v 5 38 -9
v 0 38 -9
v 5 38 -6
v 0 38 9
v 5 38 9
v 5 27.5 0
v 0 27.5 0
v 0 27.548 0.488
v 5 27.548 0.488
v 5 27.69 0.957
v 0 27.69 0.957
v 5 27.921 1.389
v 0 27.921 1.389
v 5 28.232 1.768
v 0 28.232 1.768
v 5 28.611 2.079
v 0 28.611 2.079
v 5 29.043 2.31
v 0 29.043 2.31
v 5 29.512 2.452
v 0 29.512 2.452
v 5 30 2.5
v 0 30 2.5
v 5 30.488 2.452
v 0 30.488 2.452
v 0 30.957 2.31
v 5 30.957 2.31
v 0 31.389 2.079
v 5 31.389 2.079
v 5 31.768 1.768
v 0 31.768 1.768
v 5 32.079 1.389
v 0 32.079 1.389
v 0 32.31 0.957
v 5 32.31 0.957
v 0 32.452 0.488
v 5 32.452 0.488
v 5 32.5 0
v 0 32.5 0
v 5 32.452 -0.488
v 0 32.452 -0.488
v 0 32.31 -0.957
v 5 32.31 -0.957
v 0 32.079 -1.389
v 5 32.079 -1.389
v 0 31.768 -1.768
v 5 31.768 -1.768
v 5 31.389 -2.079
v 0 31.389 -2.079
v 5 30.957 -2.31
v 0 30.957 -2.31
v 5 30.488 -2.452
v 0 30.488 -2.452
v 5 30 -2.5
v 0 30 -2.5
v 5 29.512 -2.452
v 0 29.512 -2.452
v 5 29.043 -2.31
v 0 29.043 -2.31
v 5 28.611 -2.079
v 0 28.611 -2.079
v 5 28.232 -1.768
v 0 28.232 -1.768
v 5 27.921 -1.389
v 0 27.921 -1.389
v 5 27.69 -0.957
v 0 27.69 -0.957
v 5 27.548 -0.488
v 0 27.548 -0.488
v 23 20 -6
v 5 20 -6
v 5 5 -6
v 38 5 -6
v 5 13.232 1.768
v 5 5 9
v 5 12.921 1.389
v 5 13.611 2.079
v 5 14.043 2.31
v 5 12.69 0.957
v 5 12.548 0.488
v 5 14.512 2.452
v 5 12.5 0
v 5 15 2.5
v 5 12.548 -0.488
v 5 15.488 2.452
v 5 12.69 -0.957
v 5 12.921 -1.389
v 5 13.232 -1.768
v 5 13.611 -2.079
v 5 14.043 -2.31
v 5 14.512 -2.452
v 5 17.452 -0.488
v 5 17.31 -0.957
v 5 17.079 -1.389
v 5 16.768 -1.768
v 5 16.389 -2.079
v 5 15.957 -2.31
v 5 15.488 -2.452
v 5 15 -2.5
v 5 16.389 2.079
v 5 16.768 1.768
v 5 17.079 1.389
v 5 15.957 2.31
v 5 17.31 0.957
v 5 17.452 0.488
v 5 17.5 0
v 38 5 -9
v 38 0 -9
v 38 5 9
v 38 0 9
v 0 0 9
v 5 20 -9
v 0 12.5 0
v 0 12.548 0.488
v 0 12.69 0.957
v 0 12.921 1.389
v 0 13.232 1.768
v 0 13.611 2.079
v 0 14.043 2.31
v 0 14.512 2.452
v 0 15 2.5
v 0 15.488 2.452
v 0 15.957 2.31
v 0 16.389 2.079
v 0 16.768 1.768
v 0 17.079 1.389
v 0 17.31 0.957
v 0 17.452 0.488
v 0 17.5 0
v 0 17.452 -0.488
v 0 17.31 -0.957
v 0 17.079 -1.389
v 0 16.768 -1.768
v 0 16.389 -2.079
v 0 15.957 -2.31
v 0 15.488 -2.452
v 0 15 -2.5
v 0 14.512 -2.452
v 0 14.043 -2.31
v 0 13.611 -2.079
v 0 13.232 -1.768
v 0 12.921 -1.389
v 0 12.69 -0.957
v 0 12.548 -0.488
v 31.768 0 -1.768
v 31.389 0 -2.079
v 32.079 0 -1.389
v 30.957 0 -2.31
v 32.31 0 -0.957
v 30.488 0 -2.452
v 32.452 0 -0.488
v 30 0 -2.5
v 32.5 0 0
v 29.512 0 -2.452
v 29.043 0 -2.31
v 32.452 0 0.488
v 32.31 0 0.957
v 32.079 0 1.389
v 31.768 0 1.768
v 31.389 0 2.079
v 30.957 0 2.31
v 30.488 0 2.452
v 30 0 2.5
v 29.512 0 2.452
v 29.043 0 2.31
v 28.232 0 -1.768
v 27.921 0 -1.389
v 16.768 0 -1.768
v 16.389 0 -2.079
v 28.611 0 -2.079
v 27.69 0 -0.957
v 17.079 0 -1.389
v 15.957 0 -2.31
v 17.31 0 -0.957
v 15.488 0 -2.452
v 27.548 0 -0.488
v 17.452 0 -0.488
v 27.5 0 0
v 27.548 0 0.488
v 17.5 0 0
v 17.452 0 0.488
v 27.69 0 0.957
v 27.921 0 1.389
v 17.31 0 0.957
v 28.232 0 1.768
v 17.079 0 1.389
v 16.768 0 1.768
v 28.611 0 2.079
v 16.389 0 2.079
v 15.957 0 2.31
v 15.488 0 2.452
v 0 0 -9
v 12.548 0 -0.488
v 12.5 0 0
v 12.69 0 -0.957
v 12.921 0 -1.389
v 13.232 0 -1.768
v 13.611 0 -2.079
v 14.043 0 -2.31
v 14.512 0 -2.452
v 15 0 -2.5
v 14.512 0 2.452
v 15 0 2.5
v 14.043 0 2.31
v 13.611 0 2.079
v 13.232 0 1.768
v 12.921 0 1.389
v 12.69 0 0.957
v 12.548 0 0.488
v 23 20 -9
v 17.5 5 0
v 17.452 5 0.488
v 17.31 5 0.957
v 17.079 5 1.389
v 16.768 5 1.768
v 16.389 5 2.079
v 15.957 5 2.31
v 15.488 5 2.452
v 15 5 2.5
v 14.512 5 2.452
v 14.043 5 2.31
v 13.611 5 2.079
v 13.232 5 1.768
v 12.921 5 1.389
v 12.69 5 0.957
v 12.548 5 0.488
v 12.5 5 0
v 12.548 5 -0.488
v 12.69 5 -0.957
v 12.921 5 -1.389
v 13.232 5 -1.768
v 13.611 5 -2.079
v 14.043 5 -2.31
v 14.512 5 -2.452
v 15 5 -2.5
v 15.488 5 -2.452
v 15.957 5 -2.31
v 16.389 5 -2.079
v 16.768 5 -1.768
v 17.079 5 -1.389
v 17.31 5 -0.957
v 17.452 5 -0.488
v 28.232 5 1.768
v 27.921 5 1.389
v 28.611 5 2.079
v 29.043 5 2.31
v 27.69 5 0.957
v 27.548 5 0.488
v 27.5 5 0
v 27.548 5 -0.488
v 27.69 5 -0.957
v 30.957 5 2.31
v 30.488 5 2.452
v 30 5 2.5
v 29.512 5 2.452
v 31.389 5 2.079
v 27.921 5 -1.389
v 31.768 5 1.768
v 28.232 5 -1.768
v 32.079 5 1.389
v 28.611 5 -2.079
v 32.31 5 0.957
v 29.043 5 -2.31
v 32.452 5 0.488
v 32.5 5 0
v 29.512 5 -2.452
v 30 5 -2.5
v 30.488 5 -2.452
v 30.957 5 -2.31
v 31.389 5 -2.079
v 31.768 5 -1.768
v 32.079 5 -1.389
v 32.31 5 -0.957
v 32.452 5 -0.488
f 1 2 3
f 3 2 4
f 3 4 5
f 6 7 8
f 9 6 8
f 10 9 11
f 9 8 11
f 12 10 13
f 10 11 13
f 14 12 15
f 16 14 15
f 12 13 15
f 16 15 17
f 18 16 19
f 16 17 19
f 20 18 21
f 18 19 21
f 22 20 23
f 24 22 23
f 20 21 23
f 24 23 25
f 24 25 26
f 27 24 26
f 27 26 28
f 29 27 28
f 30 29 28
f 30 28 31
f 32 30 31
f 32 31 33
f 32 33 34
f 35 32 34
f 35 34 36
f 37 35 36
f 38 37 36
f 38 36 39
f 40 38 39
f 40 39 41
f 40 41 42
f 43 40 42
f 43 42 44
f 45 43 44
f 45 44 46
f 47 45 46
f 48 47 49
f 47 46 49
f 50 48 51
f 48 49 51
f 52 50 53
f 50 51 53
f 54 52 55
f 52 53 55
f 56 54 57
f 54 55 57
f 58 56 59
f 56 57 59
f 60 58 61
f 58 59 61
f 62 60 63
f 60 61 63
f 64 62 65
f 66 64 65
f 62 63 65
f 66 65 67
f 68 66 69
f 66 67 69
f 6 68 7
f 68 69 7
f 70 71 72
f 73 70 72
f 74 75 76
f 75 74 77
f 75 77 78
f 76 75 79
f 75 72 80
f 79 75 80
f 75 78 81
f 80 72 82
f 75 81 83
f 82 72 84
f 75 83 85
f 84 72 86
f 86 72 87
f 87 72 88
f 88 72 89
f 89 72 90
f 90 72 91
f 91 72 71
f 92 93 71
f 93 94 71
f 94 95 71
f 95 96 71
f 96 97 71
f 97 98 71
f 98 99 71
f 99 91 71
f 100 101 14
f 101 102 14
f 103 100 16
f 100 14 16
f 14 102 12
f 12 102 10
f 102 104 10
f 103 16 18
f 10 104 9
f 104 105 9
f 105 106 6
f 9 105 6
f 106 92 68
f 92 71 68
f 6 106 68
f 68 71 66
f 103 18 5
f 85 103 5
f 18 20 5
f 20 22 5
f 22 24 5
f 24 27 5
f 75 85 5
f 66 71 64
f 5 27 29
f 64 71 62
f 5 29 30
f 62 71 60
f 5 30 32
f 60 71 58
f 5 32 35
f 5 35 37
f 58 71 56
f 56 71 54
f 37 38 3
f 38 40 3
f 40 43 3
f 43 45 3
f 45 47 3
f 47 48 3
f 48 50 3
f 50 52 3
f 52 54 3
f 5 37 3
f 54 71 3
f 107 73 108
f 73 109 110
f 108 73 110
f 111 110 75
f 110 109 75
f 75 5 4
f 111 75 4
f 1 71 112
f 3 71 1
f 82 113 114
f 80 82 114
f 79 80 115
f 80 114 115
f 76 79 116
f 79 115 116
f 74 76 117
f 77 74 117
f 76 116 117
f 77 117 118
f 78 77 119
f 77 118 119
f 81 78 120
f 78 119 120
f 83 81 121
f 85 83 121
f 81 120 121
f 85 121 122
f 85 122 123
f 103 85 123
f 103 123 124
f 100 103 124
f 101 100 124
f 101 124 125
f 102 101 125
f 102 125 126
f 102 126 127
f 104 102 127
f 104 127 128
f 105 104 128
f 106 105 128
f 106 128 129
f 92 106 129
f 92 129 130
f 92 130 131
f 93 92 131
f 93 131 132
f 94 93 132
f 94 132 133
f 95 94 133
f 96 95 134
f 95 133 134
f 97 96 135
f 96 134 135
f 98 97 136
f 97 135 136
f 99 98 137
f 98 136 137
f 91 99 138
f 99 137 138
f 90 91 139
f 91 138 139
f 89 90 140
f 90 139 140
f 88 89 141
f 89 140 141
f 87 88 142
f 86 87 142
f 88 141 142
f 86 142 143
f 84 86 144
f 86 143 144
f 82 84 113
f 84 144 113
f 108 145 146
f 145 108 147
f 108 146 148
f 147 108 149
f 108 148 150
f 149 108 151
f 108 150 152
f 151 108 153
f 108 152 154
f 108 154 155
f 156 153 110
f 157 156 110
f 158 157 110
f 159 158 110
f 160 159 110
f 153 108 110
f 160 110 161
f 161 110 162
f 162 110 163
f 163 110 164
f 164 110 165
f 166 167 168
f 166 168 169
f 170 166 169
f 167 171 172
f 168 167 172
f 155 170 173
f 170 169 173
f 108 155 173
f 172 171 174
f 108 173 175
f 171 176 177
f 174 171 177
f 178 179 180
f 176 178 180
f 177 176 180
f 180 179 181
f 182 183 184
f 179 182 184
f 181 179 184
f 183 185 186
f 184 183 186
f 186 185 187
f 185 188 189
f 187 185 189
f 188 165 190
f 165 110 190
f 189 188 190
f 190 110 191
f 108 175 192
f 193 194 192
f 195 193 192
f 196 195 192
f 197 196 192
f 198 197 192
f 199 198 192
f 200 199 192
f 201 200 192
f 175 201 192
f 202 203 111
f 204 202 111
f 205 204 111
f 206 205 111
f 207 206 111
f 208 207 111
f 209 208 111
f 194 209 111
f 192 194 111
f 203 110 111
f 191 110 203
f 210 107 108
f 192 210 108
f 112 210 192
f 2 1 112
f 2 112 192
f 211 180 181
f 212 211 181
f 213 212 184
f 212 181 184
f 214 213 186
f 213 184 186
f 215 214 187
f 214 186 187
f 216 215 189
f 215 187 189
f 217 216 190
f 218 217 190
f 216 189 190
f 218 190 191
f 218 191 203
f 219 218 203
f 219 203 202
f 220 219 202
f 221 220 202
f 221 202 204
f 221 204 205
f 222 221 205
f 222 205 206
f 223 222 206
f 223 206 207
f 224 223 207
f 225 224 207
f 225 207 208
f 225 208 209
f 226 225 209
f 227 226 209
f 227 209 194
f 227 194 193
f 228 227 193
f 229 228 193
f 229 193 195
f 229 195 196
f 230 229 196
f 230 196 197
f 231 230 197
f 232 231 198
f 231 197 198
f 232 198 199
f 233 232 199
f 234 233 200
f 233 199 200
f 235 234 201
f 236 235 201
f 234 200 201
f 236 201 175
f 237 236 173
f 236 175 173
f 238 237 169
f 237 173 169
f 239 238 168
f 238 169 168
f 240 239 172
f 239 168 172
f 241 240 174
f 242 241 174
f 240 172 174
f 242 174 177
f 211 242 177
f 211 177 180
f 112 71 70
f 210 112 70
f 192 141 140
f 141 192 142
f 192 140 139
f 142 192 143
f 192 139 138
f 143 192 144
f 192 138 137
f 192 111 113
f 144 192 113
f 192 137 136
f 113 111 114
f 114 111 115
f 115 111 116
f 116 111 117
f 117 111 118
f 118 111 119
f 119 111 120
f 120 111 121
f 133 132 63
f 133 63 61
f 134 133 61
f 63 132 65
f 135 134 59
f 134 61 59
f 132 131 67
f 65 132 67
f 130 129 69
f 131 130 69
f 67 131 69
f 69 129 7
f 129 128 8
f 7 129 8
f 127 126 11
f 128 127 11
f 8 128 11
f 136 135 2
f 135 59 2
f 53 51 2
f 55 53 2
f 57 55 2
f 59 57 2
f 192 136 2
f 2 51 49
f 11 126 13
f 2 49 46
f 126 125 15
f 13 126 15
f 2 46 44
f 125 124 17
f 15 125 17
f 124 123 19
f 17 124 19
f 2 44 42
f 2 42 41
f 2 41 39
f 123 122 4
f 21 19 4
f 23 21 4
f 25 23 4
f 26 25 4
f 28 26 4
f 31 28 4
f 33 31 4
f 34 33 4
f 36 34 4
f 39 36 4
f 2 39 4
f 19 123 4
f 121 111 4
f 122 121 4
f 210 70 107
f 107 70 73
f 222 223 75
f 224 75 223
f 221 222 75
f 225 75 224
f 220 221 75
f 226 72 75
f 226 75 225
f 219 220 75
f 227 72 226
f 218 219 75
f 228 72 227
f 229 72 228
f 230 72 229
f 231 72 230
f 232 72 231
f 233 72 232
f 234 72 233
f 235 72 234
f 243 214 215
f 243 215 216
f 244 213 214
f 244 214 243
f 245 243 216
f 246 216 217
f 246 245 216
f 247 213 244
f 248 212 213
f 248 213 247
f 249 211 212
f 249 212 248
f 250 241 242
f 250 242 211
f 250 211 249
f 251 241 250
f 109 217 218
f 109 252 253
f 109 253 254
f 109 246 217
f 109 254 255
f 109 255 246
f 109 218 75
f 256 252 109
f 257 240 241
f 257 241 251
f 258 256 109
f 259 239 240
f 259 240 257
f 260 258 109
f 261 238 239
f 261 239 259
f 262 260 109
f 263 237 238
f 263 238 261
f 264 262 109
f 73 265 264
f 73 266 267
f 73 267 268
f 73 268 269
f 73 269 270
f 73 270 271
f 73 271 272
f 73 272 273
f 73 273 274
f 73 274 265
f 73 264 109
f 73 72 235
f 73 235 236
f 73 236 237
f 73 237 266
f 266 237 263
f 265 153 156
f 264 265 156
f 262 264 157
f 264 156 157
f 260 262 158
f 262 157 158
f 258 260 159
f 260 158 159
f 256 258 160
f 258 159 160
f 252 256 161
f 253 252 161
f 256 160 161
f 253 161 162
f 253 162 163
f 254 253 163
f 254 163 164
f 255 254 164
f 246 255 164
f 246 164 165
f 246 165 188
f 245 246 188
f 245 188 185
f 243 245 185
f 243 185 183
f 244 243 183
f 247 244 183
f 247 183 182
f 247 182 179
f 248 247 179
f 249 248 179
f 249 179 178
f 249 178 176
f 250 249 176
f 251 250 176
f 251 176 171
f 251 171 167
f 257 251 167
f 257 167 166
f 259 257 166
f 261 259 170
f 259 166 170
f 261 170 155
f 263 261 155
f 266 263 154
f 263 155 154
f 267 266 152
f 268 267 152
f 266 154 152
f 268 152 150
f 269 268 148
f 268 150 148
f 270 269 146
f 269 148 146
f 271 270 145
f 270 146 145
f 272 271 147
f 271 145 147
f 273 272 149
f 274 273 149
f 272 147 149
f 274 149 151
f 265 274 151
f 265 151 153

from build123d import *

# Parameters (mm, degrees)
PAD_DEPTH            = 9
SKETCH001_W          = 37.346859
SKETCH001_H          = 35.838272
POCKET_DEPTH         = 6
POCKET_DEPTH_BACK    = -100
SKETCH002_R          = 2.5
POCKET001_DEPTH      = 38.001
SKETCH003_R          = 2.5
POCKET002_DEPTH      = 38.001
SKETCH004_W          = 20
SKETCH004_H          = 20
POCKET003_DEPTH      = 9.001
POCKET003_DEPTH_BACK = -9.001


with BuildPart() as part:
    # Sketch → Pad (new body, symmetric)
    with BuildSketch(Plane.XY):
        Polygon((0, 0), (0, 38), (5, 38), (38, 5), (38, 0), align=None)
    extrude(amount=PAD_DEPTH, both=True)

    # Sketch001 → Pocket (cut, two sides)
    with BuildSketch(Plane.XY) as pocket_sk:
        with Locations((23.673429, 22.919136)):
            Rectangle(SKETCH001_W, SKETCH001_H)
    extrude(amount=-POCKET_DEPTH, mode=Mode.SUBTRACT)
    extrude(pocket_sk.sketch, amount=-POCKET_DEPTH_BACK, mode=Mode.SUBTRACT)

    # Sketch002 (on Face2 of Pocket) → Pocket001 (cut, through all)
    with BuildSketch(Plane.XZ):
        with Locations((15, 0)):
            Circle(SKETCH002_R)
        with Locations((30, 0)):
            Circle(SKETCH002_R)
    extrude(amount=-POCKET001_DEPTH, mode=Mode.SUBTRACT)

    # Sketch003 (on Face1 of Pocket001) → Pocket002 (cut, through all)
    with BuildSketch(Plane(origin=(0, 0, 0), x_dir=(0, -1, 0), z_dir=(-1, 0, 0))):
        with Locations((-30, 0)):
            Circle(SKETCH003_R)
        with Locations((-15, 0)):
            Circle(SKETCH003_R)
    extrude(amount=-POCKET002_DEPTH, mode=Mode.SUBTRACT)

    # Sketch004 → Pocket003 (cut, two sides)
    with BuildSketch(Plane.XY) as pocket003_sk:
        with Locations((15, 30)):
            Rectangle(SKETCH004_W, SKETCH004_H)
    extrude(amount=-POCKET003_DEPTH, mode=Mode.SUBTRACT)
    extrude(pocket003_sk.sketch, amount=-POCKET003_DEPTH_BACK, mode=Mode.SUBTRACT)


solid = part.part
